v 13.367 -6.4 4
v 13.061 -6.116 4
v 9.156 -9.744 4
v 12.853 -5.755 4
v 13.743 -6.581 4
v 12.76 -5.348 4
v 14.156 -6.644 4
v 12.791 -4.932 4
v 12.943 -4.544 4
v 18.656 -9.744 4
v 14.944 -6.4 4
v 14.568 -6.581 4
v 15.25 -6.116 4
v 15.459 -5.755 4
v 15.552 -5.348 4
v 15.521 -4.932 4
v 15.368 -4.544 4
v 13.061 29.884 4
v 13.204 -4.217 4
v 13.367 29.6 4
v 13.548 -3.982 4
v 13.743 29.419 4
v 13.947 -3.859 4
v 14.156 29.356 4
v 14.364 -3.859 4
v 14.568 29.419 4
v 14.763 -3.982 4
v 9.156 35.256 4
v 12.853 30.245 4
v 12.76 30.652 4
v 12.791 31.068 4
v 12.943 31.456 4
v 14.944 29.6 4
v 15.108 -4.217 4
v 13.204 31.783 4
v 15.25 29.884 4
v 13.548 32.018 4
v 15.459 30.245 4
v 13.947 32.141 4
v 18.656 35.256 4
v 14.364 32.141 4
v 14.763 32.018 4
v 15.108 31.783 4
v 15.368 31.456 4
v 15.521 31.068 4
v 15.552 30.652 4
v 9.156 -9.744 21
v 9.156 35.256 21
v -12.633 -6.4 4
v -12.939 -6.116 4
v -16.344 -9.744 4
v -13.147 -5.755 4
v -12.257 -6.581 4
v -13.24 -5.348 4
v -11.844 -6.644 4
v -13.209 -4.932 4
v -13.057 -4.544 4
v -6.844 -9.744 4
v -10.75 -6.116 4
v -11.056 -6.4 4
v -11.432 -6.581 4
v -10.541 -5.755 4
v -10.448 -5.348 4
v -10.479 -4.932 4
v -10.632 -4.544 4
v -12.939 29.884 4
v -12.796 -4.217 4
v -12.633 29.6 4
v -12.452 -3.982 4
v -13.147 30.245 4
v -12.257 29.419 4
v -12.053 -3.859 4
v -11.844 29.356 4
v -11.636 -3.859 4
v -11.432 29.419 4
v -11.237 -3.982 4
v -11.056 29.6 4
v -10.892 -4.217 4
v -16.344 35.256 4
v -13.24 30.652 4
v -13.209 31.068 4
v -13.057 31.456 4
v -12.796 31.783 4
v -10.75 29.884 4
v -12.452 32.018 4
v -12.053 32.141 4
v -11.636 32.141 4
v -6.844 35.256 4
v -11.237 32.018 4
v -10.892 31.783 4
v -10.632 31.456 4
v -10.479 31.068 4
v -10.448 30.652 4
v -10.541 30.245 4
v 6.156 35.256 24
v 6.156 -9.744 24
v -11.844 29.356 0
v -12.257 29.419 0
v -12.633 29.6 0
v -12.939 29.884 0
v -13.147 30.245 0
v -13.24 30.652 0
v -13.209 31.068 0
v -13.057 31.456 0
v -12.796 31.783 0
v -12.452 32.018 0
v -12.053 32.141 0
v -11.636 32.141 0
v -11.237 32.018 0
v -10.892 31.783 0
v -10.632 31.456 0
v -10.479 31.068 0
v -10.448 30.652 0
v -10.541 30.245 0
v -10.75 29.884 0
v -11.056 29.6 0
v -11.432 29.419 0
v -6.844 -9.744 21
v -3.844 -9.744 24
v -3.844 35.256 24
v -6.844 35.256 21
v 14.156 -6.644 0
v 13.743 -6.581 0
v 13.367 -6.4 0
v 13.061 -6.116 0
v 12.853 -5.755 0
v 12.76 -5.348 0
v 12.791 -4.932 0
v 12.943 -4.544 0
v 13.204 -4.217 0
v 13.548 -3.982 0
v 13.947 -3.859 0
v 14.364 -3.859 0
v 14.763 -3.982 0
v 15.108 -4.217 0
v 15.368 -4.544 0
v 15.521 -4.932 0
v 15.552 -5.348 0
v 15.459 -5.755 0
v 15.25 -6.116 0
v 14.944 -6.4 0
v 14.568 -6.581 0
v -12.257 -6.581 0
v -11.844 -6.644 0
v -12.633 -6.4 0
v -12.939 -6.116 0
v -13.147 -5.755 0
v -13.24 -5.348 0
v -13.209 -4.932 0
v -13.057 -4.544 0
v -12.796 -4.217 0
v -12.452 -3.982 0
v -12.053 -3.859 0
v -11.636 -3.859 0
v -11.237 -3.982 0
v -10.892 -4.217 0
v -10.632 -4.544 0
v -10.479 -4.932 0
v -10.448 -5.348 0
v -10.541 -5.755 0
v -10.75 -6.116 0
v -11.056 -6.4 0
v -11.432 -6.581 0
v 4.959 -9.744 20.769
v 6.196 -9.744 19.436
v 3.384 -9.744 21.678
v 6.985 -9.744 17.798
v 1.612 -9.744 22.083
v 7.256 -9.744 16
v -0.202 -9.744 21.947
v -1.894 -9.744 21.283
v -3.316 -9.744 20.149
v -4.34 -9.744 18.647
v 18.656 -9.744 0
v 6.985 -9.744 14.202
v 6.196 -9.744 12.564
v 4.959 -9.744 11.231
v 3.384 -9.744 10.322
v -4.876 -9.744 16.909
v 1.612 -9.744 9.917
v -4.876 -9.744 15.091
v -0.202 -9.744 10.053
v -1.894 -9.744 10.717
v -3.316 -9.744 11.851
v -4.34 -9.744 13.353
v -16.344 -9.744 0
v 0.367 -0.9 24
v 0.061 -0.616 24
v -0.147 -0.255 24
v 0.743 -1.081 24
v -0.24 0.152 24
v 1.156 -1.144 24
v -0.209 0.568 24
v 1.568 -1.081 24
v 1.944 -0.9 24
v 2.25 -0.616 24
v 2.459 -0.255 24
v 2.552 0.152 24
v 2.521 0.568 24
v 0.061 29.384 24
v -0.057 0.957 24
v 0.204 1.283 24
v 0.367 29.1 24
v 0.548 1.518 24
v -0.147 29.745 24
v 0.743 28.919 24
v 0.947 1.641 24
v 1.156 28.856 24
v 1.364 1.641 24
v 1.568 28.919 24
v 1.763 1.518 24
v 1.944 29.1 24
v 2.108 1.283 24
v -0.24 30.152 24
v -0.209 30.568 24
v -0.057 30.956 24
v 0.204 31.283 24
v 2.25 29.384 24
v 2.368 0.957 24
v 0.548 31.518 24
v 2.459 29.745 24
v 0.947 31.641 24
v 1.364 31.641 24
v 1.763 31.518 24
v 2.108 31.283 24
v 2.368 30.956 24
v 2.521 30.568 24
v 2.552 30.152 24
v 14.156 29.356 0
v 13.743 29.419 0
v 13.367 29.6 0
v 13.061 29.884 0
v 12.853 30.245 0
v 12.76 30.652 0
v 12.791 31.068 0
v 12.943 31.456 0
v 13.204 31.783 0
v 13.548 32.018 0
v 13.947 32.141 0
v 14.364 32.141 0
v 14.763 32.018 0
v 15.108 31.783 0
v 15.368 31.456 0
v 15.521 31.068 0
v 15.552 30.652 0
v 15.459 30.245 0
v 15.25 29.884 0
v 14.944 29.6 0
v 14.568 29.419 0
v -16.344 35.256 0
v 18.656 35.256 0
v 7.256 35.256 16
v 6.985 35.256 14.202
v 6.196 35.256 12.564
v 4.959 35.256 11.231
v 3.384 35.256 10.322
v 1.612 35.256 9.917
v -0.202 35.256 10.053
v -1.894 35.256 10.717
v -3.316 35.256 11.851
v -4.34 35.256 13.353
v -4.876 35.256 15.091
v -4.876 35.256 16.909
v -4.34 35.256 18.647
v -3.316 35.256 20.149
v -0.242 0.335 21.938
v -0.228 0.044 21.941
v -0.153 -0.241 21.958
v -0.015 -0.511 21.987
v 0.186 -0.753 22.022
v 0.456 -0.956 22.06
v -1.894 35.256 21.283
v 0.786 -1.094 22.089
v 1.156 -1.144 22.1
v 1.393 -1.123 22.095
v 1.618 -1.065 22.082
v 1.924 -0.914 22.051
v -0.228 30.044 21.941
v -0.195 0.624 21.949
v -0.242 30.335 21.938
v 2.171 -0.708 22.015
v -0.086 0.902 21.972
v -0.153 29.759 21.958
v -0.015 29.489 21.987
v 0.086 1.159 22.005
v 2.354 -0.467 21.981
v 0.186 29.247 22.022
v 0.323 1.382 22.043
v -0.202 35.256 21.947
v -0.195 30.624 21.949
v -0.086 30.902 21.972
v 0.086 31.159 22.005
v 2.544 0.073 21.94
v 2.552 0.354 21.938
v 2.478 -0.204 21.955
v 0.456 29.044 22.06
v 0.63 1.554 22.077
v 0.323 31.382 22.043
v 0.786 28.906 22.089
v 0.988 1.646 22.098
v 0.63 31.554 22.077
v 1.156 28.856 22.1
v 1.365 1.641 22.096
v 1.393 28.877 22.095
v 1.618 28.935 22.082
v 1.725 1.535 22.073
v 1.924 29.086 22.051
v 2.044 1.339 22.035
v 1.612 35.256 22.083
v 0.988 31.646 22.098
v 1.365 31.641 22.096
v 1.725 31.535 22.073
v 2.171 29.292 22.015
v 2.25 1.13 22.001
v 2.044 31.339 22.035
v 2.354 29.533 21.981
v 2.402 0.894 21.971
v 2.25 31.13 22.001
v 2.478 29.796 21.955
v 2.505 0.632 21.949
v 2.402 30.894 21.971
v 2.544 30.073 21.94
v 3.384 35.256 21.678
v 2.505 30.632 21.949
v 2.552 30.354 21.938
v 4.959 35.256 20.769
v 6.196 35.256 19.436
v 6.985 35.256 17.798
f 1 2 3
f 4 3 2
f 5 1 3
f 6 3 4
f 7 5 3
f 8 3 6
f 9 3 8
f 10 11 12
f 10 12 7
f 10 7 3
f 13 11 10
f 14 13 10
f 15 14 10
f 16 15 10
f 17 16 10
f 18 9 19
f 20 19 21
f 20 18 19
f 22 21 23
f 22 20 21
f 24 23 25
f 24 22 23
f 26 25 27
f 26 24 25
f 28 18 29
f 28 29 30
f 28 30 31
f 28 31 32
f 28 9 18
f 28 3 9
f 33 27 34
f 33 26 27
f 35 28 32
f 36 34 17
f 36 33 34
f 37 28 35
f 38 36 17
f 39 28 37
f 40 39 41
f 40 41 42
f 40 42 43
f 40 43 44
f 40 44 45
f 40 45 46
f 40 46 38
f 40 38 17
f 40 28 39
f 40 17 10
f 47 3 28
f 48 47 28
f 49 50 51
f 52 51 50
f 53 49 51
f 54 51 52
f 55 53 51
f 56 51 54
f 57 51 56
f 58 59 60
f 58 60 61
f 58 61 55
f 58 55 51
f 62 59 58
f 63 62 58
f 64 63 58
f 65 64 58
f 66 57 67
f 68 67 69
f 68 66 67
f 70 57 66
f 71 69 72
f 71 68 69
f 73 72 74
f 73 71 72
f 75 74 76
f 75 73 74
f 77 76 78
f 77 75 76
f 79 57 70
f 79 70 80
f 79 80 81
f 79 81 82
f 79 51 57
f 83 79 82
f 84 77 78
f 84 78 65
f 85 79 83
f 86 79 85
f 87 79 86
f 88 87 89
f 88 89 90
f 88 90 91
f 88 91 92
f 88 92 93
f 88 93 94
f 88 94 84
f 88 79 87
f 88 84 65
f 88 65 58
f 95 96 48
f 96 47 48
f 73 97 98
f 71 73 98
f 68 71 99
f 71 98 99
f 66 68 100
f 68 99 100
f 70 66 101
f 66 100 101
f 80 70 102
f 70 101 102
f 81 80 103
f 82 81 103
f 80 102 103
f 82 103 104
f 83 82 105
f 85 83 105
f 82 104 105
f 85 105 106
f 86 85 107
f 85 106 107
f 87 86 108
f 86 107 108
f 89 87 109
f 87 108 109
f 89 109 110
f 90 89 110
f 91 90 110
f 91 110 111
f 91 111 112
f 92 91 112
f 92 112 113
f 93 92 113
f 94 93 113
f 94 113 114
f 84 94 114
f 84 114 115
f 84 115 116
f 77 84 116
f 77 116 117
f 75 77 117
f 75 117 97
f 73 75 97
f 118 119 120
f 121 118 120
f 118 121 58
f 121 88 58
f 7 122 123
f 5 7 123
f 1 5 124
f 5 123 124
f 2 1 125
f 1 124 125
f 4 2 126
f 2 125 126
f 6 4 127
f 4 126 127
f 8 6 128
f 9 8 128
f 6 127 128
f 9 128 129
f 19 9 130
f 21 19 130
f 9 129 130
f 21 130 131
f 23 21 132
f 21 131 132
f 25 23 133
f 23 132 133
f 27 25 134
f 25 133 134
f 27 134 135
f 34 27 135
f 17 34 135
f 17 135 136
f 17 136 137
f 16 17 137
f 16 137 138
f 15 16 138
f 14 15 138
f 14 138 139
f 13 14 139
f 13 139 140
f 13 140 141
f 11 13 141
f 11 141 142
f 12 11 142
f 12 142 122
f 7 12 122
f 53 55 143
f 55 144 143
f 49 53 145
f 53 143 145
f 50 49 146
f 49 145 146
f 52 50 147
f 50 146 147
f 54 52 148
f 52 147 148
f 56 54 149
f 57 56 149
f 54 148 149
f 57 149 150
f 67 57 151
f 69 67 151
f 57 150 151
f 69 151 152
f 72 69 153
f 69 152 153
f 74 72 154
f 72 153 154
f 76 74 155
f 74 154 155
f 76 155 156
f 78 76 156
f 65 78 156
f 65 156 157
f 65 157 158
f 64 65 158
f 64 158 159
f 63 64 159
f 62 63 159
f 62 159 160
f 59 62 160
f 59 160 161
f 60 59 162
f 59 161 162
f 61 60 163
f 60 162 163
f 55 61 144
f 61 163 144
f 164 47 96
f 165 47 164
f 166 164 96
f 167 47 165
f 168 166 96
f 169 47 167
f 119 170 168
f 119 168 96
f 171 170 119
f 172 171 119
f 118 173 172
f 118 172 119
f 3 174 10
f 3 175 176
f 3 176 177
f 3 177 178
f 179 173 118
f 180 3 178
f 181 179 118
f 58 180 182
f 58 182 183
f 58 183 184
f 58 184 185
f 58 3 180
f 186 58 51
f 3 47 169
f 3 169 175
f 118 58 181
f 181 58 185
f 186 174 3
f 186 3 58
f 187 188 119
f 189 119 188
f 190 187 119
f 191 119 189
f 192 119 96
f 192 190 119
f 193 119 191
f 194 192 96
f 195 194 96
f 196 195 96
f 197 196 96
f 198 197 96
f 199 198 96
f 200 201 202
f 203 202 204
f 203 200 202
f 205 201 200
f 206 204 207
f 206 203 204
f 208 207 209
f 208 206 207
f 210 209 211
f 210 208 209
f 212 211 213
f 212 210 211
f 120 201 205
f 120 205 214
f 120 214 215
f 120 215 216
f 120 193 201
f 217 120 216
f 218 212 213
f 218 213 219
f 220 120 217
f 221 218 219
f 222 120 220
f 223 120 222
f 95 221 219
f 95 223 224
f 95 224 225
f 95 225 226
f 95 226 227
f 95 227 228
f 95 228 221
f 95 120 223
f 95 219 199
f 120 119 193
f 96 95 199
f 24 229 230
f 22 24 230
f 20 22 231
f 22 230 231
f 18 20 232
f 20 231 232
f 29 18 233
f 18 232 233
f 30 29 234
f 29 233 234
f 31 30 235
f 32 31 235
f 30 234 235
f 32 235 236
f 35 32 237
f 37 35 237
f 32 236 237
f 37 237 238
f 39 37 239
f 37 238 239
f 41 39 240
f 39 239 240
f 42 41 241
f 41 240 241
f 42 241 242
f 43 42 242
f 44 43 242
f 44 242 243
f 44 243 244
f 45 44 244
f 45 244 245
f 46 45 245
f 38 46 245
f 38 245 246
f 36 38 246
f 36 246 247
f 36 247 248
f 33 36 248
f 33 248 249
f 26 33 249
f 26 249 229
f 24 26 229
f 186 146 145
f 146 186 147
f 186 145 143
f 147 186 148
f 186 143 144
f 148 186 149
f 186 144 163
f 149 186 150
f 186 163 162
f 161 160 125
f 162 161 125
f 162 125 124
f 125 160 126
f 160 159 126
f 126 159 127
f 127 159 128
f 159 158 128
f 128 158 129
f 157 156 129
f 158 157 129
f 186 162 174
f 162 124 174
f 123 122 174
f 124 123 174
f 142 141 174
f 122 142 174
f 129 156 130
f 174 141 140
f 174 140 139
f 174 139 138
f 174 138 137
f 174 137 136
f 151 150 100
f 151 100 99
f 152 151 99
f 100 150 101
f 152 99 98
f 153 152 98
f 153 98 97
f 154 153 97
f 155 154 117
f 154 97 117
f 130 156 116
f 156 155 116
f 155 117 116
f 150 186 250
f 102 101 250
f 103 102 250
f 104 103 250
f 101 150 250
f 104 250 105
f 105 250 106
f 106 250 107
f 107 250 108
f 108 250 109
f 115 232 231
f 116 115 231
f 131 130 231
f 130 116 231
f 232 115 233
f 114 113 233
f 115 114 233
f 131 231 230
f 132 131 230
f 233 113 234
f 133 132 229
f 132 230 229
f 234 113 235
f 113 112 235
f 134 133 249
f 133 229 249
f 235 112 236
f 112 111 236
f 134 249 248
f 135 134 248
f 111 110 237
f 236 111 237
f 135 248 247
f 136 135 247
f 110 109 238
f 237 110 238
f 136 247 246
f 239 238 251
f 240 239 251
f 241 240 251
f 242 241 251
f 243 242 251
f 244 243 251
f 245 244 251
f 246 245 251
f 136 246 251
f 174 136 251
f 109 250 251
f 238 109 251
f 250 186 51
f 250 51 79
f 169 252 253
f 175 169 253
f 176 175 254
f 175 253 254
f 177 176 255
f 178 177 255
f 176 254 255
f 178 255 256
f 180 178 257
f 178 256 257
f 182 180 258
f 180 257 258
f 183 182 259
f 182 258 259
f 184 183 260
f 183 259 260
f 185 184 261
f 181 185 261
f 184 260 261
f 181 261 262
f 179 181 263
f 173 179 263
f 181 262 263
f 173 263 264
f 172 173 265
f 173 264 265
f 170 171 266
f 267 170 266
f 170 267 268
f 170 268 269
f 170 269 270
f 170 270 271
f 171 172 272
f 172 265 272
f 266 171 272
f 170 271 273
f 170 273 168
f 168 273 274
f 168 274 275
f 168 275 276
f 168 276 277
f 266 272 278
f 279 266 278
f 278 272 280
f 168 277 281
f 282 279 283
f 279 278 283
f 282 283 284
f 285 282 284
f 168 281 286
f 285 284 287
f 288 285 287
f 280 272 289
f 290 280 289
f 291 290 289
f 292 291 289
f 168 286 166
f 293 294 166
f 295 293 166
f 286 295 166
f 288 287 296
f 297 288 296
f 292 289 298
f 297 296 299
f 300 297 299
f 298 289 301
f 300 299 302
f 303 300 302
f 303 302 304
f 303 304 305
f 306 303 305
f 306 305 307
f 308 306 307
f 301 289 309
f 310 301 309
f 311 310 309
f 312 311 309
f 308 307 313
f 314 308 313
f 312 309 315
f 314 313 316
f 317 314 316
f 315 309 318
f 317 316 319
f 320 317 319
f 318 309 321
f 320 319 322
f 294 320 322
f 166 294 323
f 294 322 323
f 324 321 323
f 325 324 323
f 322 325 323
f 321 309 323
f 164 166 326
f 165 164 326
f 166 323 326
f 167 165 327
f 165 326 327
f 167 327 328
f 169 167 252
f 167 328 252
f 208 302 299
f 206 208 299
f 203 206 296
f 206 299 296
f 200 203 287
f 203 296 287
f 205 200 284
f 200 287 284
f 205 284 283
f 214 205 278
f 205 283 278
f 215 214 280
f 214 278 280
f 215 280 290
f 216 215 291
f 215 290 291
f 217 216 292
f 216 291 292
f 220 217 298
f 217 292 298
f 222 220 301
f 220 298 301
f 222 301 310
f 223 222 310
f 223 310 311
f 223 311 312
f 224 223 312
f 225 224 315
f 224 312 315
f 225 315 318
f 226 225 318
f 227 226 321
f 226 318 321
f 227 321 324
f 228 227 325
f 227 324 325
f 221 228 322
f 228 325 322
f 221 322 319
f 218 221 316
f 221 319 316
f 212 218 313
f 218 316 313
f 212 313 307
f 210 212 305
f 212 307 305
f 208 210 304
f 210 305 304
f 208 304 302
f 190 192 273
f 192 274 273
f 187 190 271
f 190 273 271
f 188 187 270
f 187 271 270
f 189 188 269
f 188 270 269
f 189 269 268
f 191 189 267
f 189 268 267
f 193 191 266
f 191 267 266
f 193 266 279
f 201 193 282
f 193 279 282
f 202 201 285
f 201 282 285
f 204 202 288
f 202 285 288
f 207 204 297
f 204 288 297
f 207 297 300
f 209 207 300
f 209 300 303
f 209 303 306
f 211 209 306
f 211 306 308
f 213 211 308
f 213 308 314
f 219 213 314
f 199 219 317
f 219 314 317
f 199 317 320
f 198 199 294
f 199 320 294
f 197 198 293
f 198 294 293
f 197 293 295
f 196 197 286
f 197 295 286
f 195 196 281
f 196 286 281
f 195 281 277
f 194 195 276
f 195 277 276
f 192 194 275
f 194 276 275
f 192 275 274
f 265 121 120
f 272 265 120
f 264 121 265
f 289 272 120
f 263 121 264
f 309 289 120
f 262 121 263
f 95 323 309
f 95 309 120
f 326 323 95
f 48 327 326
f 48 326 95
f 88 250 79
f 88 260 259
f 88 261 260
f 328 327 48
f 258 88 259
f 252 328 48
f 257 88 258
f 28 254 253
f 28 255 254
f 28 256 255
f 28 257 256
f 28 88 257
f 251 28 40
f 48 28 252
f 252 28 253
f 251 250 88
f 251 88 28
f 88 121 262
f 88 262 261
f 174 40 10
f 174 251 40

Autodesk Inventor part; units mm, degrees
ref_plane "YZ Plane" through (0, 0, 0) normal (1, 0, 0) x (0, 1, 0)
ref_plane "XZ Plane" through (0, 0, 0) normal (0, 1, 0) x (-1, 0, 0)
ref_plane "XY Plane" through (0, 0, 0) normal (0, 0, 1) x (1, 0, 0)
sketch "Sketch1" plane through (0, 0, 0) normal (0, 0, 1) x (1, 0, 0)
  line L0 (-16.3442, 35.2565) -> (18.6558, 35.2565)
  line L1 (18.6558, 35.2565) -> (18.6558, -9.7435)
  line L2 (18.6558, -9.7435) -> (-16.3442, -9.7435)
  line L3 (-16.3442, -9.7435) -> (-16.3442, 35.2565)
  point P0 (0, 0)
  dimension "d0" = 35
  dimension "d1" = 45
extrude "Extrusion1" add sketch "Sketch1" along normal blind 4
sketch "Sketch2" plane through (0, 0, 4) normal (0, 0, 1) x (1, 0, 0)
  line L0 (-6.8442, -9.7435) -> (9.1558, -9.7435)
  line L1 (9.1558, -9.7435) -> (9.1558, 35.2565)
  line L2 (9.1558, 35.2565) -> (-6.8442, 35.2565)
  line L3 (-6.8442, 35.2565) -> (-6.8442, -9.7435)
  line L4 (-16.3442, -9.7435) -> (18.6558, -9.7435) projected
  line L5 (18.6558, 35.2565) -> (-16.3442, 35.2565) projected
  line L6 (-6.8442, 14.4079) -> (-16.3442, 14.4079)
  line L7 (-16.3442, 35.2565) -> (-16.3442, -9.7435) projected
  line L8 (9.1558, 13.7437) -> (18.6558, 13.7437)
  line L9 (18.6558, -9.7435) -> (18.6558, 35.2565) projected
  point P0 (0, 0)
  dimension "d4" = 16
extrude "Extrusion2" add sketch "Sketch2" along normal blind 20 contours L3 L2 L1 L0
sketch "Sketch3" plane through (-16.3442, 35.2565, 0) normal (0, 1, 0) x (1, 0, 0)
  circle A0 centre (17.5, -16) radius 6.1
  line L0 (25.5, -4) -> (25.5, -24) projected
  line L1 (25.5, -24) -> (9.5, -24) projected
  point P0 (16.3442, 0)
  dimension "d7" = 12.2
  dimension "d8" = 8
  dimension "d9" = 8
extrude "Extrusion3" cut sketch "Sketch3" against normal blind 45
chamfer "Chamfer1" distance 3 angle 45 2 edges at (-6.8442, 12.7565, 24) (9.1558, 12.7565, 24)
sketch "Sketch4" plane through (0, 0, 24) normal (0, 0, 1) x (1, 0, 0)
  line L0 (6.1558, 35.2565) -> (-3.8442, 35.2565) projected
  line L1 (6.1558, 35.2565) -> (6.1558, -9.7435) projected
  line L2 (-3.8442, -9.7435) -> (6.1558, -9.7435) projected
  point P0 (0, 0)
  point P1 (1.1558, 30.2565)
  point P2 (1.1558, 0.2565)
  dimension "d15" = 5
  dimension "d16" = 5
  dimension "d17" = 10
  dimension "d18" = 5
hole "Hole1" at (1.1558, 30.2565, 24) at (1.1558, 0.2565, 24) direction (0, 0, -1) diameter 2.8 depth 10
sketch "Sketch5" plane through (0, 0, 4) normal (0, 0, 1) x (1, 0, 0)
  line L0 (-6.8442, 35.2565) -> (-16.3442, 35.2565) projected
  line L1 (-16.3442, 35.2565) -> (-16.3442, -9.7435) projected
  point P0 (0, 0)
  point P1 (-11.8442, 30.7565)
  dimension "d26" = 4.5
  dimension "d27" = 4.5
hole "Hole2" at (-11.8442, 30.7565, 4) direction (0, 0, -1) diameter 2.8 depth 10
pattern_linear "Rectangular Pattern1" count 2 spacing 26 along (1, 0, 0) count 2 spacing 36 along (0, -1, 0) of "Hole2"
properties part number "microscope mount"
